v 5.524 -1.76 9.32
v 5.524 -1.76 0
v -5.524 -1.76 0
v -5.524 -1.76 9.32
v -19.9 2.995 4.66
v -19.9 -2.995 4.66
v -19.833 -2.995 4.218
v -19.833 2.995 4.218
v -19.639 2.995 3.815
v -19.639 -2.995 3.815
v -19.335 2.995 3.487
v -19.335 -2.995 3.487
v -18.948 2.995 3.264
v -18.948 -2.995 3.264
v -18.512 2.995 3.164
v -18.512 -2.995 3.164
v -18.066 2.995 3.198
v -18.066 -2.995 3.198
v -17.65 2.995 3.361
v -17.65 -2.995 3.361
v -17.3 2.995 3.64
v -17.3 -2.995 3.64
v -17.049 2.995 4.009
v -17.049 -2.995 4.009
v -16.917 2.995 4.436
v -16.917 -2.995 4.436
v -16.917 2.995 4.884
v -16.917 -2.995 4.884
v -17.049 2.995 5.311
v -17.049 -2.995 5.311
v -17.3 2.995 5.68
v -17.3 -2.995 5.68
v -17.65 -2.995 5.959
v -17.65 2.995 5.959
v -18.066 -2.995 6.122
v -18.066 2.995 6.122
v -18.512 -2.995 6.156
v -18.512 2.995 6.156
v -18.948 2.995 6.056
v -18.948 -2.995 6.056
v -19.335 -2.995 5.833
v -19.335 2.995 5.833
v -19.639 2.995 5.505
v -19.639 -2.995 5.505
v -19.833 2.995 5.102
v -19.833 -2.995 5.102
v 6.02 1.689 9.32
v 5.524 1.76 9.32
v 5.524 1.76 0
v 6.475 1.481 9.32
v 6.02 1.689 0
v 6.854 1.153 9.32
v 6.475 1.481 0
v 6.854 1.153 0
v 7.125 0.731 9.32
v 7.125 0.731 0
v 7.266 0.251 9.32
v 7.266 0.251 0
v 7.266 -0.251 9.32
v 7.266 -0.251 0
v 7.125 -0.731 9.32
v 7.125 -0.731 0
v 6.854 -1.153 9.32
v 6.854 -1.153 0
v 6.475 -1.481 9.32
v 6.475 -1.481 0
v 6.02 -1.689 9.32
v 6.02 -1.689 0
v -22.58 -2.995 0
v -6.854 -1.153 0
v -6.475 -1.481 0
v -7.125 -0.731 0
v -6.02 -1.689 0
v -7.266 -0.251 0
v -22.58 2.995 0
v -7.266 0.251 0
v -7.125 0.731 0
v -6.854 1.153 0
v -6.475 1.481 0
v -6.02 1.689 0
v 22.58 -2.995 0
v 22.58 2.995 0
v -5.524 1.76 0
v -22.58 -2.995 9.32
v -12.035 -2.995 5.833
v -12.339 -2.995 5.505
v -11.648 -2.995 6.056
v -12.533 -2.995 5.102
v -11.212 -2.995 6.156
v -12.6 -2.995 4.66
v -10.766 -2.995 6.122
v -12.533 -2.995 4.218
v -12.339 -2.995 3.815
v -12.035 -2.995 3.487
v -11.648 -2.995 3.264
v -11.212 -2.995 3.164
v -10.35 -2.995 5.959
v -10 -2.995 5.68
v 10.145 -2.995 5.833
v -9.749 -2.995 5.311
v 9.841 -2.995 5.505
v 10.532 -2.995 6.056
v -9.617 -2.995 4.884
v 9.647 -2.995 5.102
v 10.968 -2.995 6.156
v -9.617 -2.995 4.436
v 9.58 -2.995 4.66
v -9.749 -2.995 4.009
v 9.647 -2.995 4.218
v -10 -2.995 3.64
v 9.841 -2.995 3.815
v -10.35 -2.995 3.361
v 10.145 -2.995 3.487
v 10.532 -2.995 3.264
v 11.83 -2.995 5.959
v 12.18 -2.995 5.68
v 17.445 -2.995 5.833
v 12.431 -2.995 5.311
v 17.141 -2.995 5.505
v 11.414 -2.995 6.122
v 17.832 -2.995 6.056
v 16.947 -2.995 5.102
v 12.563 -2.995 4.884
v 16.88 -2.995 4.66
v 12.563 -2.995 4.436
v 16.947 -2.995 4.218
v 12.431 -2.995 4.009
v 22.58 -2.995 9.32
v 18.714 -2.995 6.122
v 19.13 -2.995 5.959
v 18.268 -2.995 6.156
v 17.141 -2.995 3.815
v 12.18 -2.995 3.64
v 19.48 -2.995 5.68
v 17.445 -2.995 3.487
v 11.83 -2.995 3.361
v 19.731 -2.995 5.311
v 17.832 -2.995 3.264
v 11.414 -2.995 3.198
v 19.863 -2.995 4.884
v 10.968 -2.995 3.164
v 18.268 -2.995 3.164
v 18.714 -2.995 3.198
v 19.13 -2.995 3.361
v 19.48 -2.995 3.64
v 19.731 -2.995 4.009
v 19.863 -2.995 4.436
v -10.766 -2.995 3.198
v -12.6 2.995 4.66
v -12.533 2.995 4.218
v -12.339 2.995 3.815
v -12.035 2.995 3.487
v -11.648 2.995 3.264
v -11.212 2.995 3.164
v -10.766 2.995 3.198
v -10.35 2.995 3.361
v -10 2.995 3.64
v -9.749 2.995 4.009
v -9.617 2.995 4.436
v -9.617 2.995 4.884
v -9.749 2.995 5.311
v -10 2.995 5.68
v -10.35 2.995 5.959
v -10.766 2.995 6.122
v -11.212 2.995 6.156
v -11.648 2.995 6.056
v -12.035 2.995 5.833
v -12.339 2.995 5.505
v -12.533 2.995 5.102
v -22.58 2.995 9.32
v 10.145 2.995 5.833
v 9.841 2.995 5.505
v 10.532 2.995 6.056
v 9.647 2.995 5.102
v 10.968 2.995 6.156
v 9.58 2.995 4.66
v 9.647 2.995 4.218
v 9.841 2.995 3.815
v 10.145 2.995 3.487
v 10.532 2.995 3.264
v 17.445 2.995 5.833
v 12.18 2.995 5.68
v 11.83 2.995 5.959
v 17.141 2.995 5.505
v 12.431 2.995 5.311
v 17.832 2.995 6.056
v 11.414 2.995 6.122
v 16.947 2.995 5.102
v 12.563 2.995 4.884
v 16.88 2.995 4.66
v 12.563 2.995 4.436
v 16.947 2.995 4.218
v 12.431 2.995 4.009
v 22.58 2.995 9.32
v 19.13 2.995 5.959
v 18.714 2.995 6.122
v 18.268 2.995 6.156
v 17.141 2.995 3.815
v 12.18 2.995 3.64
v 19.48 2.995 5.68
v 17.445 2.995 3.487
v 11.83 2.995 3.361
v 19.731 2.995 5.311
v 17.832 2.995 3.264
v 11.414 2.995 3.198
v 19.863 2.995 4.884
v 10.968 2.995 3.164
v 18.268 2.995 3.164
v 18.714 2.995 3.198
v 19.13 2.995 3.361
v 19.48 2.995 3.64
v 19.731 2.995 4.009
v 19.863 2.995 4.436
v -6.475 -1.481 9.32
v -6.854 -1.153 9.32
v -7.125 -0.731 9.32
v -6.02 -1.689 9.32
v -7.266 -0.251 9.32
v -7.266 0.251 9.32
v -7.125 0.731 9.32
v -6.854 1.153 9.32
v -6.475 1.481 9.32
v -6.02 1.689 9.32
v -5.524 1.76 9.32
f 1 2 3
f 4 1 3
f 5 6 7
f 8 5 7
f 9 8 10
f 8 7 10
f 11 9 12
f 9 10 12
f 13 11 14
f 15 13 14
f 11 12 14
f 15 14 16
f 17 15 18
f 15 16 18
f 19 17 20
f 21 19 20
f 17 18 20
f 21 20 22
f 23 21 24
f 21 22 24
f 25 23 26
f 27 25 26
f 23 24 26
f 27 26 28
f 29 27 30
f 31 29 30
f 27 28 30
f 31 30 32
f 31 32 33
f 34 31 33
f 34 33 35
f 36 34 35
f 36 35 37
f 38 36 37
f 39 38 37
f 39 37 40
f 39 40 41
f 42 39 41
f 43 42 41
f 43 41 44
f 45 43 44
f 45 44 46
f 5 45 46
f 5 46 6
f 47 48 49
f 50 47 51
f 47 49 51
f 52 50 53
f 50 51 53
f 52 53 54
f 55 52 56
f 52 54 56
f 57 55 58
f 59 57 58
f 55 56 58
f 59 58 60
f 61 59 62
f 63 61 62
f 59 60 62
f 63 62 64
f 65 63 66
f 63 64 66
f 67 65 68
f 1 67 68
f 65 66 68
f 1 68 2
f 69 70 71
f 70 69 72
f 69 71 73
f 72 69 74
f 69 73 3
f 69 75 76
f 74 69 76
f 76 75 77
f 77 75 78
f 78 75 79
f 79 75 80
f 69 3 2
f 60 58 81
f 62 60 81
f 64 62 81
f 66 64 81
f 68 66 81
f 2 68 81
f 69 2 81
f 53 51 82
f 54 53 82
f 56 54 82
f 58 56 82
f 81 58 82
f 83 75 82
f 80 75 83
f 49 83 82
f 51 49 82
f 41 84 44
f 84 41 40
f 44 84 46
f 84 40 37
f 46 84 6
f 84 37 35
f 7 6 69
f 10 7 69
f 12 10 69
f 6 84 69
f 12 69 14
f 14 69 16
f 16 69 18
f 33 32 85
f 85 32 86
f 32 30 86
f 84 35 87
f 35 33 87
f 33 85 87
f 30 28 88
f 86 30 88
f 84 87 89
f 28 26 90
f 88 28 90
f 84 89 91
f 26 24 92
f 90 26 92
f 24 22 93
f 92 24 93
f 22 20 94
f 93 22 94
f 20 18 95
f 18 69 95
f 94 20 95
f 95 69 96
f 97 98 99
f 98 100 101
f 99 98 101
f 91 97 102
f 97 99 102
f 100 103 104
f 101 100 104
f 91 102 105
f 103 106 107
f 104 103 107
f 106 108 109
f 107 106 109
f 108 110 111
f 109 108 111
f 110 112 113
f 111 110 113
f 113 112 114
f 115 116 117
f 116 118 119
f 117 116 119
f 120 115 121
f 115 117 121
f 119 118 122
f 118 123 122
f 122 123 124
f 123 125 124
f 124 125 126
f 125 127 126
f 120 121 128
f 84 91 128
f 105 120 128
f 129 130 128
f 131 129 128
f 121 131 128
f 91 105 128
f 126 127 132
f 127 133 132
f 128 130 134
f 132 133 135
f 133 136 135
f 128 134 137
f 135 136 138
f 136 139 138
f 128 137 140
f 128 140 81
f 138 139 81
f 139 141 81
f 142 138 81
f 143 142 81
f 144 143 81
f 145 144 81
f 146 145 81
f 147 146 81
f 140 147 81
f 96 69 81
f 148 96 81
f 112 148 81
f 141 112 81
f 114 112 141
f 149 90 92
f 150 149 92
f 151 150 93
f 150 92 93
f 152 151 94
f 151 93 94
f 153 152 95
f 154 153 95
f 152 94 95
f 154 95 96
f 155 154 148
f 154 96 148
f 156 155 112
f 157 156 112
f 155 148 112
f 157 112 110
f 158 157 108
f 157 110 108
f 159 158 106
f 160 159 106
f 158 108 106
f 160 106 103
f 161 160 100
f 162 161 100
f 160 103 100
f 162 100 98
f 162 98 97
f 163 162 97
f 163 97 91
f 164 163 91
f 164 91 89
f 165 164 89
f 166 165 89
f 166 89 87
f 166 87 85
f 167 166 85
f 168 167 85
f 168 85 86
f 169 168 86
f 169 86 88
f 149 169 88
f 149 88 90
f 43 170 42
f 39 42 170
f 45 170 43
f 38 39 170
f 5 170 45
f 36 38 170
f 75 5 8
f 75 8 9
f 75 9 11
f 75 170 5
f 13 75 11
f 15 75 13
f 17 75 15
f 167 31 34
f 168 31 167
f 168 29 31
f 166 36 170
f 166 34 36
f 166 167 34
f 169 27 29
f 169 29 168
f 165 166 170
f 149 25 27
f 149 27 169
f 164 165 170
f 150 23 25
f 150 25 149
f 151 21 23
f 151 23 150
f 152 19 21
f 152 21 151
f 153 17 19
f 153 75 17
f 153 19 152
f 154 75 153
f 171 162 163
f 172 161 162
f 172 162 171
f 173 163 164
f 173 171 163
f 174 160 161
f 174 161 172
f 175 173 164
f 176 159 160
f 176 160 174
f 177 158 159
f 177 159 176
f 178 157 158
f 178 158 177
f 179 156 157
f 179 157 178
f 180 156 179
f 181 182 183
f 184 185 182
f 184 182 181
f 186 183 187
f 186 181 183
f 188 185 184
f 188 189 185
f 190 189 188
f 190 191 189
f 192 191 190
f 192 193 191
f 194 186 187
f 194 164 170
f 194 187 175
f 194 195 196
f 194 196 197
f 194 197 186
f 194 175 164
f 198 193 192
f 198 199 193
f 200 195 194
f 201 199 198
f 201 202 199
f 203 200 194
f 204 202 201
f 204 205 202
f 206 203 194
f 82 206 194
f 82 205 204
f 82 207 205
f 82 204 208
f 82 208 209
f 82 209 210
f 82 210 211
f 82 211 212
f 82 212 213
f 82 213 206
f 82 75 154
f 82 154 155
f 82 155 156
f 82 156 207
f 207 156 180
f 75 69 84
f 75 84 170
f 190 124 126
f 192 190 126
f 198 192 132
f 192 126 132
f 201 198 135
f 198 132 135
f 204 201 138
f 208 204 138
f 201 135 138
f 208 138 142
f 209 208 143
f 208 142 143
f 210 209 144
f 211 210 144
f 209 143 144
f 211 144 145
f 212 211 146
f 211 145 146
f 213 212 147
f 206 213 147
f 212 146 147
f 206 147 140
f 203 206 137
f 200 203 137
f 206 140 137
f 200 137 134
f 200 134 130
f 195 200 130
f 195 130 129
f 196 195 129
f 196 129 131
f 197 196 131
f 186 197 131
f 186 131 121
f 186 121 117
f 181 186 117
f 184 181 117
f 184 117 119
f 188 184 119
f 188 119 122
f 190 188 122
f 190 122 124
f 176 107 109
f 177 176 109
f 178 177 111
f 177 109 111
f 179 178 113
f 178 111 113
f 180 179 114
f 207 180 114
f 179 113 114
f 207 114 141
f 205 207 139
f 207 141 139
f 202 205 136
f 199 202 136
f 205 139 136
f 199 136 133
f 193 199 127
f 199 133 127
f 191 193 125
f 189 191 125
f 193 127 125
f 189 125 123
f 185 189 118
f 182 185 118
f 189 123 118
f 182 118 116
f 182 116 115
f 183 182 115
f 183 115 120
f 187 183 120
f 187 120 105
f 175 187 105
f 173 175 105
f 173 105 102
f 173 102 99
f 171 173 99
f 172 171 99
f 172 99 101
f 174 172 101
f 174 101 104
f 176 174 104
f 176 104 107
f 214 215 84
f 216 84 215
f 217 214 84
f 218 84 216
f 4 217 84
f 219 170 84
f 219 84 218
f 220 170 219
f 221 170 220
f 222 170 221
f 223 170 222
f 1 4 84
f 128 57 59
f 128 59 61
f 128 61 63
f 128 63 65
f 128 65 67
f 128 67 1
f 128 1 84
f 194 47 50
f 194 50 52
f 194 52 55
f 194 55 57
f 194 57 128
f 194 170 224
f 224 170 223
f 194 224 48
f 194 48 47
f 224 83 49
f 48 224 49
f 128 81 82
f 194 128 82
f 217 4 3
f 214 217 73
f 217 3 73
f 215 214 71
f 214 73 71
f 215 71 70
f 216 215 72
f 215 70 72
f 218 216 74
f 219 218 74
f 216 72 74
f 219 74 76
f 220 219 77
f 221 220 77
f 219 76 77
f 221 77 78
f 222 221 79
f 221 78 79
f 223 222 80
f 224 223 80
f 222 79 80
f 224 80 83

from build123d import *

# Parameters (mm, degrees)
SKETCH1_W                 = 45.16
SKETCH1_H                 = 5.99
BOSS_EXTRUDE1_DEPTH       = 9.32
F_3_0MM_DOWEL_HOLE1_D     = 3
F_3_0MM_DOWEL_HOLE1_DEPTH = 10
F_3_0MM_DOWEL_HOLE1_TIP   = 0.901290929


with BuildPart() as part:
    # Sketch1 → Boss-Extrude1 (new body)
    with BuildSketch(Plane.XY):
        Rectangle(SKETCH1_W, SKETCH1_H)
        with BuildLine():
            Line((5.523637636, -1.760435864), (-5.523637636, -1.760435864))
            ThreePointArc((-5.523637636, -1.760435864), (-7.284073501, 0), (-5.523637636, 1.760435864))
            Line((-5.523637636, 1.760435864), (5.523637636, 1.760435864))
            ThreePointArc((5.523637636, 1.760435864), (7.284073501, 0), (5.523637636, -1.760435864))
        make_face(mode=Mode.SUBTRACT)
    extrude(amount=BOSS_EXTRUDE1_DEPTH)

    # Ø3.0mm Dowel Hole1
    with Locations(Plane(origin=(0, 2.995, 0), x_dir=(1, 0, 0), z_dir=(0, 1, 0))):
        with Locations((-18.4, -4.66), (-11.1, -4.66), (11.08, -4.66), (18.38, -4.66)):
            Hole(F_3_0MM_DOWEL_HOLE1_D / 2, depth=F_3_0MM_DOWEL_HOLE1_DEPTH)
            with Locations((0, 0, -(F_3_0MM_DOWEL_HOLE1_DEPTH + F_3_0MM_DOWEL_HOLE1_TIP / 2))):  # 118° drill point
                Cone(0, F_3_0MM_DOWEL_HOLE1_D / 2, F_3_0MM_DOWEL_HOLE1_TIP, mode=Mode.SUBTRACT)


solid = part.part
